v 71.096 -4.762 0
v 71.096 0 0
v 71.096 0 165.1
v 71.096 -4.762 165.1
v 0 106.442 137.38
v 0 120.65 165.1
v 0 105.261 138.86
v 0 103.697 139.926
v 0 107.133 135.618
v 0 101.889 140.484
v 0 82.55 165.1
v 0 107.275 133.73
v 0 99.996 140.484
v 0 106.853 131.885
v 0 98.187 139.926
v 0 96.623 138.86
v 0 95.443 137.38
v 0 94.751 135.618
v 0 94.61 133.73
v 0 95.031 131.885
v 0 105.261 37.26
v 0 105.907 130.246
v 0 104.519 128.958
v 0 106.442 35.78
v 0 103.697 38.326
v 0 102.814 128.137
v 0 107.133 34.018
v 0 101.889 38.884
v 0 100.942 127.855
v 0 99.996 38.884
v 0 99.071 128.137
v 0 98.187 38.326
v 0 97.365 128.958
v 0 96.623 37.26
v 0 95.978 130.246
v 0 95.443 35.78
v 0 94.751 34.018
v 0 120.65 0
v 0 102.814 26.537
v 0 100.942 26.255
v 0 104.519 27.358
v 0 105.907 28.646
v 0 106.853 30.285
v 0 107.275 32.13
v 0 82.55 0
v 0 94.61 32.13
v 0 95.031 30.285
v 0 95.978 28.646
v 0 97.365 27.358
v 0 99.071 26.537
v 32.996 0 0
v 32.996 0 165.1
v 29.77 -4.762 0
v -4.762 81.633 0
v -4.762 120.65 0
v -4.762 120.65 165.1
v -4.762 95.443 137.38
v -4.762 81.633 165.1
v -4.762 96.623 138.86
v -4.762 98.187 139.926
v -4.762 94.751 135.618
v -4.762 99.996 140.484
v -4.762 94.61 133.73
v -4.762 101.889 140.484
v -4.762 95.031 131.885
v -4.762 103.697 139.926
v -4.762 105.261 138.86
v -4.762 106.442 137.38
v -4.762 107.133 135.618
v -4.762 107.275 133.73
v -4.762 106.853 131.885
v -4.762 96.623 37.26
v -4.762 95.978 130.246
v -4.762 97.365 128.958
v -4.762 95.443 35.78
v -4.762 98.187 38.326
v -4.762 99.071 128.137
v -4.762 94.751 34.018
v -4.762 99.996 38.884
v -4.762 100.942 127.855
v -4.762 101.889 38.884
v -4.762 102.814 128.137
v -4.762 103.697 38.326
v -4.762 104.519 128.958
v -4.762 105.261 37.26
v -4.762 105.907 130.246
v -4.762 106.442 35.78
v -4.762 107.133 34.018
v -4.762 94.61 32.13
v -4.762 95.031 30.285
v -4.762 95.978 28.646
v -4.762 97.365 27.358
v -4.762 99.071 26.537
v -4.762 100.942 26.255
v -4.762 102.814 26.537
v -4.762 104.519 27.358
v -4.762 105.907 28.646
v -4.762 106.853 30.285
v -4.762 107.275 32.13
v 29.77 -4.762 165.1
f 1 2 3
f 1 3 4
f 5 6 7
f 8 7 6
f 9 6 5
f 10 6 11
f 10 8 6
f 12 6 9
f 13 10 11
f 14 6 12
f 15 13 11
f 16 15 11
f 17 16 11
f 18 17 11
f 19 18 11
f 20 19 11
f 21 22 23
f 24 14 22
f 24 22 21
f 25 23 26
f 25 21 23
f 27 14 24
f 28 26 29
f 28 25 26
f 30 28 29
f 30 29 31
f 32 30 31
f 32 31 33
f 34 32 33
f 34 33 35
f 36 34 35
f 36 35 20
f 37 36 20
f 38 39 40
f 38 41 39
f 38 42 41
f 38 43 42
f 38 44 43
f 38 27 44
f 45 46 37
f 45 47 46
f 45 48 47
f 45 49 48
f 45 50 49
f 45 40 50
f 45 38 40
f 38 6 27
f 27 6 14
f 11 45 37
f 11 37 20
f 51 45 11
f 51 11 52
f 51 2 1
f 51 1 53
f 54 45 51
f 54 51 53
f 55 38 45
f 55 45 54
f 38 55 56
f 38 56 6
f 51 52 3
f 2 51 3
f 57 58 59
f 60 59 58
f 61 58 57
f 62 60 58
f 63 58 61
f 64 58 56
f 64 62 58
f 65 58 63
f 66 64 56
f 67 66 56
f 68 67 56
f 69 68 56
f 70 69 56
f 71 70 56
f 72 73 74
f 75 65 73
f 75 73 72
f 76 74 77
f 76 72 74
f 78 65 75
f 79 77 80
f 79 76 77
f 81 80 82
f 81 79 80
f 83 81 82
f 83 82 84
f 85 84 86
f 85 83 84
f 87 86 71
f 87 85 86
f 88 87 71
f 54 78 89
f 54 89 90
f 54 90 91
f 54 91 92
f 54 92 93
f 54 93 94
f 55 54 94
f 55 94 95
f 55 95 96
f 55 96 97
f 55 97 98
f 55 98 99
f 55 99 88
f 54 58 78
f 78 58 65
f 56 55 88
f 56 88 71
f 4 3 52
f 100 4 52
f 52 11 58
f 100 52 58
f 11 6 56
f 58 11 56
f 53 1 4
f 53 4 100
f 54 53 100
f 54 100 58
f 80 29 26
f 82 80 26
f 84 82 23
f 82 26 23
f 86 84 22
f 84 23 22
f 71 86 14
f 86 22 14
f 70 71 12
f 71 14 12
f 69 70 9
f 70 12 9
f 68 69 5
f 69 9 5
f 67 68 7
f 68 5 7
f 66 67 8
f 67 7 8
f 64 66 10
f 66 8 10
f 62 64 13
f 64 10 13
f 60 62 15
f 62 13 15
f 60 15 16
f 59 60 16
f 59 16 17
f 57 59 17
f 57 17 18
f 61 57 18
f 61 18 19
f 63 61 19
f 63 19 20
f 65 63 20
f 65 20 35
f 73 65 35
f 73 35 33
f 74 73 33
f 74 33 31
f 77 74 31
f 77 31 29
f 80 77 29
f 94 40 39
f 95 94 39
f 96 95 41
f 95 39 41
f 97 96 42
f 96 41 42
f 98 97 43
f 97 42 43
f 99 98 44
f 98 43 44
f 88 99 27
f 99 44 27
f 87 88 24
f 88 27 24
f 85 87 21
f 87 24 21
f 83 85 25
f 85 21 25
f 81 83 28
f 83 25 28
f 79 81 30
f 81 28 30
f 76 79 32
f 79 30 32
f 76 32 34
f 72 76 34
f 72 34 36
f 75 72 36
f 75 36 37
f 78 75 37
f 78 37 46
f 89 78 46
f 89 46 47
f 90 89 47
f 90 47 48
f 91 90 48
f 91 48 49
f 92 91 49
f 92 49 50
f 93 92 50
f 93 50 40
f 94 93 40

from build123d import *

# Parameters (mm, degrees)
EXTRUDE_THIN1_DEPTH = 165.1
SKETCH2_R           = 6.35
CUT_EXTRUDE1_DEPTH  = 5.7625


with BuildPart() as part:
    # Sketch1 → Extrude-Thin1 (new body)
    with BuildSketch(Plane.XY):
        Polygon((0, 120.65), (0, 82.55), (32.995567884, 0), (71.095567884, 0), (71.095567884, -4.7625), (29.770312185, -4.7625), (-4.7625, 81.633456448), (-4.7625, 120.65), align=None)
    extrude(amount=EXTRUDE_THIN1_DEPTH)

    # Sketch2 → Cut-Extrude1 (cut, through all)
    with BuildSketch(Plane(origin=(0, 0, 0), x_dir=(0, 0, -1), z_dir=(1, 0, 0))):
        with Locations((-134.204880657, 100.94227704)):
            Circle(SKETCH2_R)
        with Locations((-32.604880657, 100.94227704)):
            Circle(SKETCH2_R)
    extrude(amount=-CUT_EXTRUDE1_DEPTH, mode=Mode.SUBTRACT)


solid = part.part
